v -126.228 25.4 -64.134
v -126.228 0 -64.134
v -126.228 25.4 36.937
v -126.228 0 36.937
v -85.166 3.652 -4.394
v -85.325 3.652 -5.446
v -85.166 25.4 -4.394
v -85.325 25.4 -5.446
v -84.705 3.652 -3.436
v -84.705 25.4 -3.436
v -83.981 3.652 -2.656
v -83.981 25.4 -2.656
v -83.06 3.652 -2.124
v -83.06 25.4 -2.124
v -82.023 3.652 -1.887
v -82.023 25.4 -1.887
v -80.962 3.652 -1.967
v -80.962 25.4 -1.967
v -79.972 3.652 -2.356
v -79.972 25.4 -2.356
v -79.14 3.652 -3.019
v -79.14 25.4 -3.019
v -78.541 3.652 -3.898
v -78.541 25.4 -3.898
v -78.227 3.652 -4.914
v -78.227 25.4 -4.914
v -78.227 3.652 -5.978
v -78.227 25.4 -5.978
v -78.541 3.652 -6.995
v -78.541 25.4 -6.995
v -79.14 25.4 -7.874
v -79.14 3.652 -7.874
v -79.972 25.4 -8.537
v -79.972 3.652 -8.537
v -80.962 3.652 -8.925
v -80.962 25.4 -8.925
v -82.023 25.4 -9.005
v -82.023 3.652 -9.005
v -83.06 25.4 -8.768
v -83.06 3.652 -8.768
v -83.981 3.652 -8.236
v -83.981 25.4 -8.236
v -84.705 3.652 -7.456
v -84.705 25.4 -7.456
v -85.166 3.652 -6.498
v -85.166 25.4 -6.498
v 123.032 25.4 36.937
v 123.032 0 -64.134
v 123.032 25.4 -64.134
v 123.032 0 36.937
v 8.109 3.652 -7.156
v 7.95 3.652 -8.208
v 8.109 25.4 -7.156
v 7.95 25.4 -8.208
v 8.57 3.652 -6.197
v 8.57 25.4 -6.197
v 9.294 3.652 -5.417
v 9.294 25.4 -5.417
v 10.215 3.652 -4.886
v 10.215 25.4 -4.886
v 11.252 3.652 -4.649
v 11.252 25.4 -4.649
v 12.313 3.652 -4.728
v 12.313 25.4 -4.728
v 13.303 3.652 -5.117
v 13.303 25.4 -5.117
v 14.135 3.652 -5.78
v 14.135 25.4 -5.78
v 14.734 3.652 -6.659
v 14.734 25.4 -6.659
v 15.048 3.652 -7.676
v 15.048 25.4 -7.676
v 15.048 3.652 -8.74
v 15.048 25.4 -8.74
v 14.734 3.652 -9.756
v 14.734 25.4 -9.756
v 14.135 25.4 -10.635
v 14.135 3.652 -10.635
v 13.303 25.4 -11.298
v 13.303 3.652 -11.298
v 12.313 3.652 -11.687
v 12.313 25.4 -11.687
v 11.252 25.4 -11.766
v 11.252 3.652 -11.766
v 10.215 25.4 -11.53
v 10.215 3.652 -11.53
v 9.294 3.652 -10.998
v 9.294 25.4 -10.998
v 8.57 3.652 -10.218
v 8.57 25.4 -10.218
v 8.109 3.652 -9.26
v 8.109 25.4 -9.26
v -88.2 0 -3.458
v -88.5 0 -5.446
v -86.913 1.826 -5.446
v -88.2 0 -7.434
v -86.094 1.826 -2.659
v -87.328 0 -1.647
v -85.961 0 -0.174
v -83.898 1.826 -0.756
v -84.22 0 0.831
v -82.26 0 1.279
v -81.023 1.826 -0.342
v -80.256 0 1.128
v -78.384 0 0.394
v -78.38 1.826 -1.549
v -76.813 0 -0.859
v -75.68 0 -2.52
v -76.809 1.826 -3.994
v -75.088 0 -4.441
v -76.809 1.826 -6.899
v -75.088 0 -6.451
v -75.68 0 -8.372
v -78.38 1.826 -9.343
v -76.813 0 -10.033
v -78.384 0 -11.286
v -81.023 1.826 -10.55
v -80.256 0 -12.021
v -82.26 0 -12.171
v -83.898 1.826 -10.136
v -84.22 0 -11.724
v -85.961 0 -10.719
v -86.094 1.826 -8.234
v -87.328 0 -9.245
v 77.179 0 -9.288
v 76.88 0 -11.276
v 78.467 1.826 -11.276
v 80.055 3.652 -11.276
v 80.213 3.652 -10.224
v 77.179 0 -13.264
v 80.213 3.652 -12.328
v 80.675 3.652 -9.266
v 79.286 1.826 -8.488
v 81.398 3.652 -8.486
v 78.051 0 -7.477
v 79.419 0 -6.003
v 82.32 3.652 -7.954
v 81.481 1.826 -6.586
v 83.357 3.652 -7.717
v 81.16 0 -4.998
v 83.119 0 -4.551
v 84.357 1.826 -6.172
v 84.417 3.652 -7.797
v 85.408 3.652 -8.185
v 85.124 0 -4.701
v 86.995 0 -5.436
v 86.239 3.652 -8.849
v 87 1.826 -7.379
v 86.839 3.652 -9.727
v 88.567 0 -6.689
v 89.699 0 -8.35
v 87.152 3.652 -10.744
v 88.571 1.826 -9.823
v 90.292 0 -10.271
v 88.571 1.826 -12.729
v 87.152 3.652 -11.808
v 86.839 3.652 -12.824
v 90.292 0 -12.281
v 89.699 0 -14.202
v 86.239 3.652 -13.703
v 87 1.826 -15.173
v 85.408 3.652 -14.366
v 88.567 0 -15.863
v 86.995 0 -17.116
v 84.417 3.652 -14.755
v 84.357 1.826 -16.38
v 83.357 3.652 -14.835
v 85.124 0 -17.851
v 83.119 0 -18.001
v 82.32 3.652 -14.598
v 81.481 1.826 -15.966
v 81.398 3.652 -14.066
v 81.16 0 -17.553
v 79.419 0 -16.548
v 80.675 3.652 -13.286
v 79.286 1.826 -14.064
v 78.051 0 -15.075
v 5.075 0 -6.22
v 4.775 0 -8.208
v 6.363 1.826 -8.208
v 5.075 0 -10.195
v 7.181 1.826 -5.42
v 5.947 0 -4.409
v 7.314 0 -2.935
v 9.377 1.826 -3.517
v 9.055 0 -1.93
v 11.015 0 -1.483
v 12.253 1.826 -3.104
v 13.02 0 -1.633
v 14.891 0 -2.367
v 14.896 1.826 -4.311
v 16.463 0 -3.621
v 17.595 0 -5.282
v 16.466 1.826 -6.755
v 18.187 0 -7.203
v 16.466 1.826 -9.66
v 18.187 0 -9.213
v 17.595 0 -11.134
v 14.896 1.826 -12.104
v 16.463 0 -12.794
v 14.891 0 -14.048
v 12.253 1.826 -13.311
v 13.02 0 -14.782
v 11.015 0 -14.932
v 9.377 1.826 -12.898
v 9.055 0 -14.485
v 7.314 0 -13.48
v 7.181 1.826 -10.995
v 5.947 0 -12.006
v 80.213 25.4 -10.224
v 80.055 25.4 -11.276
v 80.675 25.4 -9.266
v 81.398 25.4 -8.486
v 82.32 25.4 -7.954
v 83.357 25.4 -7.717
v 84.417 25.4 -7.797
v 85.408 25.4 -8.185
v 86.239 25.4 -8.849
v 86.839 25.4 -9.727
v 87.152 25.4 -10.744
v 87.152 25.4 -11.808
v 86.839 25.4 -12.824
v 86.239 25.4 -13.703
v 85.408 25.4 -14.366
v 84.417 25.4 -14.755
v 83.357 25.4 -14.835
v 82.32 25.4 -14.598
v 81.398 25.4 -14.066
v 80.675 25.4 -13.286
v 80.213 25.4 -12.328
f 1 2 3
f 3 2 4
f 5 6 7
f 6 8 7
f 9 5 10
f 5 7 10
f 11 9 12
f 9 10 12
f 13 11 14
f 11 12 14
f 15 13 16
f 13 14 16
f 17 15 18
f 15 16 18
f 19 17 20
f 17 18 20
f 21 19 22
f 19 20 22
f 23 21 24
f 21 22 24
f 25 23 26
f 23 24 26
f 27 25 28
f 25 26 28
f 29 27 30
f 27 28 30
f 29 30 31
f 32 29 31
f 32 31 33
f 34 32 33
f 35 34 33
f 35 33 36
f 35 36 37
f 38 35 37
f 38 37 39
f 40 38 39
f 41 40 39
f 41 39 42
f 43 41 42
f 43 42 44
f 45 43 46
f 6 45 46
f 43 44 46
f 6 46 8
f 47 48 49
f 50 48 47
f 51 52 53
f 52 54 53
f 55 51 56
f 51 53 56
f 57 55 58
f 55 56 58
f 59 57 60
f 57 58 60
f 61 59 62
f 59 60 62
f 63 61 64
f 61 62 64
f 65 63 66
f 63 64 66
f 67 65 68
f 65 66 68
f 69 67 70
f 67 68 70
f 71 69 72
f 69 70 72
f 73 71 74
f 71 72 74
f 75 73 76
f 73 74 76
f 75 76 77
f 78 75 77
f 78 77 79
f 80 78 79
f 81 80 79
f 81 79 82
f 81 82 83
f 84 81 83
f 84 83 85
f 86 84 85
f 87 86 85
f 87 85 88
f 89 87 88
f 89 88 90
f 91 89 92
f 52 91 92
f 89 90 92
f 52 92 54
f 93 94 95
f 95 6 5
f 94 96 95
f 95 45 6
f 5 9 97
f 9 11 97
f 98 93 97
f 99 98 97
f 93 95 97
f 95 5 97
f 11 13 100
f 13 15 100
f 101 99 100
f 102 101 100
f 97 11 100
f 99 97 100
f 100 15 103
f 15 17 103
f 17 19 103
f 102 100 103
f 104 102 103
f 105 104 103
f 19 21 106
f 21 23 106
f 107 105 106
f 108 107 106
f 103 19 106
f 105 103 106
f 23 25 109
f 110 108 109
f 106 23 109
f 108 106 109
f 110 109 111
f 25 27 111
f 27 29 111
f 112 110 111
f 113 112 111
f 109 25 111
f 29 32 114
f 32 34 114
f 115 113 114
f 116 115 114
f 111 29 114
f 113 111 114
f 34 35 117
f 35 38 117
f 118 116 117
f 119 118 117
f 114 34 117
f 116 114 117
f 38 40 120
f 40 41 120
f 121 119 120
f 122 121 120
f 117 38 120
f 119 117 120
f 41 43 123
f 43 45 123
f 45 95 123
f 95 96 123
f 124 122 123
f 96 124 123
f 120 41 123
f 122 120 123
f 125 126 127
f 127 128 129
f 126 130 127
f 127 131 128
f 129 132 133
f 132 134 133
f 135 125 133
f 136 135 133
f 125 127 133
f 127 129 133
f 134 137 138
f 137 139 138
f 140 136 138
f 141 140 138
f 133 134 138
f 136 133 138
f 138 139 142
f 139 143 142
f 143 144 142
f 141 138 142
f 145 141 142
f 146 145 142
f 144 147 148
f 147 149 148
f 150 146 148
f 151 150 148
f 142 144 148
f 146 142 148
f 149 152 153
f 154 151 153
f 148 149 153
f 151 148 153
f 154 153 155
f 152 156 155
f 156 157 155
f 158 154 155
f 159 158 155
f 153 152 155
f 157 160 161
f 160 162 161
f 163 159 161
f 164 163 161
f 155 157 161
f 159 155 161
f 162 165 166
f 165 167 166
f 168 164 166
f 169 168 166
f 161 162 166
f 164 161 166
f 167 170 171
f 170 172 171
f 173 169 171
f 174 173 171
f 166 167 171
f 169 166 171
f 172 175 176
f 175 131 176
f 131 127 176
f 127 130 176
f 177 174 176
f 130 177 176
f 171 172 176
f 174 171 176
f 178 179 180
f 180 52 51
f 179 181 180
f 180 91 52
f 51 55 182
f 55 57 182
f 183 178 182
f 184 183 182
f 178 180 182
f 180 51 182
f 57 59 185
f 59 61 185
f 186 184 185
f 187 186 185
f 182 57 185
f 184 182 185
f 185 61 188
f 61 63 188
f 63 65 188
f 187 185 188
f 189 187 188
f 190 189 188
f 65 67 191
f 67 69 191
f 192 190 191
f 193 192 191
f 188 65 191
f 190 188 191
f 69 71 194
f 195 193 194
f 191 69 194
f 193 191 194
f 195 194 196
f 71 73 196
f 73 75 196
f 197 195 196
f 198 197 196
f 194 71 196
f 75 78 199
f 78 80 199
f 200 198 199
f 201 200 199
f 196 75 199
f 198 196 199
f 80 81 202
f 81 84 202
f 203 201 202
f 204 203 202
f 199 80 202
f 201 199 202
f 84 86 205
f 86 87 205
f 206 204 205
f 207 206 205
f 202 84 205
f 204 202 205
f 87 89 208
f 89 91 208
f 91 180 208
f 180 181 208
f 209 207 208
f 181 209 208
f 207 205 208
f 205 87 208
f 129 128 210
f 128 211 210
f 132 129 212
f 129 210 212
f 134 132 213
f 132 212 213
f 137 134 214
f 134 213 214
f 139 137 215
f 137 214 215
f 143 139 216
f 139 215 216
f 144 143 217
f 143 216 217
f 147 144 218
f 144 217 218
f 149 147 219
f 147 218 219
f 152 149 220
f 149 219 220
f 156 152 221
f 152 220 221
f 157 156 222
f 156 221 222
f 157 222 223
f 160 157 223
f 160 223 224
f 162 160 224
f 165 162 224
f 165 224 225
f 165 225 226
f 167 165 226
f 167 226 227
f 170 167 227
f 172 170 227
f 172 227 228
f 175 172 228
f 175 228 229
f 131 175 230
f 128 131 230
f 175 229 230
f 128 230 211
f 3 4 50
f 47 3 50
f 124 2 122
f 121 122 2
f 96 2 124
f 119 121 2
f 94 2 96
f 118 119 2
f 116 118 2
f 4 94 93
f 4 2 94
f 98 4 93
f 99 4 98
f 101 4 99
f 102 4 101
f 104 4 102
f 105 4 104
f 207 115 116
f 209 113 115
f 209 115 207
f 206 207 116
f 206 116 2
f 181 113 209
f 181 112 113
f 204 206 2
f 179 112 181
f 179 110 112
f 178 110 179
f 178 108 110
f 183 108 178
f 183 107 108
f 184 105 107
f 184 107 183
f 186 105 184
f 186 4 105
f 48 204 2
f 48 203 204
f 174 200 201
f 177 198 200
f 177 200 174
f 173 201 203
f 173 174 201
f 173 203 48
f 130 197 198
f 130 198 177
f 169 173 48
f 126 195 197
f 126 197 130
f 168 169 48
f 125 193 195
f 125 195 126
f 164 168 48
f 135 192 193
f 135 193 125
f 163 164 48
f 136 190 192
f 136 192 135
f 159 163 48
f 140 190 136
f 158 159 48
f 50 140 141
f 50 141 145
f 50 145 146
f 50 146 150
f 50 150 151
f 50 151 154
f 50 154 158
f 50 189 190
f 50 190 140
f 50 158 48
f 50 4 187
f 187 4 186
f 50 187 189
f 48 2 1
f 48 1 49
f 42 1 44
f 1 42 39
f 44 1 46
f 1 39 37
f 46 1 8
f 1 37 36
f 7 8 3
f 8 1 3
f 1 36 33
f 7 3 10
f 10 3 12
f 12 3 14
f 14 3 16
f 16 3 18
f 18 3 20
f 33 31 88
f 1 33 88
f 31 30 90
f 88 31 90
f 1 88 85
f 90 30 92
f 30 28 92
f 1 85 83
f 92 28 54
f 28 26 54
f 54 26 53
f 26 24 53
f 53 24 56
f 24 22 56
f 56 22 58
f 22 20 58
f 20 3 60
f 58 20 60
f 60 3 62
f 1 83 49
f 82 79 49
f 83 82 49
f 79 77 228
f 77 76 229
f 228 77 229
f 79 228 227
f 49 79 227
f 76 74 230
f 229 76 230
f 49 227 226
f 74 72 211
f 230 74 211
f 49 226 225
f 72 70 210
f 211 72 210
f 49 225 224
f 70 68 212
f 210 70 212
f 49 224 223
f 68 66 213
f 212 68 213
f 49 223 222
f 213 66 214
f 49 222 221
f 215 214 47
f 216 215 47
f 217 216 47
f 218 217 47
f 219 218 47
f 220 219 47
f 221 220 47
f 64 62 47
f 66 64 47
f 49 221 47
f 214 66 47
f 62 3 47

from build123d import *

# Parameters (mm, degrees)
F0_W           = 249.260224402
F0_H           = 101.0710969567
F1_DEPTH       = 25.4
F3_D           = 7.1374
F3_CSINK_D     = 13.4874
F3_CSINK_ANGLE = 82
F4_D           = 7.1374
F4_CSINK_D     = 13.4874
F4_CSINK_ANGLE = 82


with BuildPart() as f1:
    # F0 (on Front) → F1 (new body)
    with BuildSketch(Plane.XZ):
        with Locations((-1.5978179872, -13.5989002883)):
            Rectangle(F0_W, F0_H)
    extrude(amount=-F1_DEPTH)

    # F3 (through all)
    with Locations(Plane.XZ):
        with Locations((-81.7563086748, -5.4461751133)):
            CounterSinkHole(F3_D / 2, F3_CSINK_D / 2, counter_sink_angle=F3_CSINK_ANGLE)

    # F4 (through all)
    with Locations(Plane.XZ):
        with Locations((11.5190250799, -8.2076163962), (83.6233198643, -11.2758828327)):
            CounterSinkHole(F4_D / 2, F4_CSINK_D / 2, counter_sink_angle=F4_CSINK_ANGLE)


solid = f1.part
